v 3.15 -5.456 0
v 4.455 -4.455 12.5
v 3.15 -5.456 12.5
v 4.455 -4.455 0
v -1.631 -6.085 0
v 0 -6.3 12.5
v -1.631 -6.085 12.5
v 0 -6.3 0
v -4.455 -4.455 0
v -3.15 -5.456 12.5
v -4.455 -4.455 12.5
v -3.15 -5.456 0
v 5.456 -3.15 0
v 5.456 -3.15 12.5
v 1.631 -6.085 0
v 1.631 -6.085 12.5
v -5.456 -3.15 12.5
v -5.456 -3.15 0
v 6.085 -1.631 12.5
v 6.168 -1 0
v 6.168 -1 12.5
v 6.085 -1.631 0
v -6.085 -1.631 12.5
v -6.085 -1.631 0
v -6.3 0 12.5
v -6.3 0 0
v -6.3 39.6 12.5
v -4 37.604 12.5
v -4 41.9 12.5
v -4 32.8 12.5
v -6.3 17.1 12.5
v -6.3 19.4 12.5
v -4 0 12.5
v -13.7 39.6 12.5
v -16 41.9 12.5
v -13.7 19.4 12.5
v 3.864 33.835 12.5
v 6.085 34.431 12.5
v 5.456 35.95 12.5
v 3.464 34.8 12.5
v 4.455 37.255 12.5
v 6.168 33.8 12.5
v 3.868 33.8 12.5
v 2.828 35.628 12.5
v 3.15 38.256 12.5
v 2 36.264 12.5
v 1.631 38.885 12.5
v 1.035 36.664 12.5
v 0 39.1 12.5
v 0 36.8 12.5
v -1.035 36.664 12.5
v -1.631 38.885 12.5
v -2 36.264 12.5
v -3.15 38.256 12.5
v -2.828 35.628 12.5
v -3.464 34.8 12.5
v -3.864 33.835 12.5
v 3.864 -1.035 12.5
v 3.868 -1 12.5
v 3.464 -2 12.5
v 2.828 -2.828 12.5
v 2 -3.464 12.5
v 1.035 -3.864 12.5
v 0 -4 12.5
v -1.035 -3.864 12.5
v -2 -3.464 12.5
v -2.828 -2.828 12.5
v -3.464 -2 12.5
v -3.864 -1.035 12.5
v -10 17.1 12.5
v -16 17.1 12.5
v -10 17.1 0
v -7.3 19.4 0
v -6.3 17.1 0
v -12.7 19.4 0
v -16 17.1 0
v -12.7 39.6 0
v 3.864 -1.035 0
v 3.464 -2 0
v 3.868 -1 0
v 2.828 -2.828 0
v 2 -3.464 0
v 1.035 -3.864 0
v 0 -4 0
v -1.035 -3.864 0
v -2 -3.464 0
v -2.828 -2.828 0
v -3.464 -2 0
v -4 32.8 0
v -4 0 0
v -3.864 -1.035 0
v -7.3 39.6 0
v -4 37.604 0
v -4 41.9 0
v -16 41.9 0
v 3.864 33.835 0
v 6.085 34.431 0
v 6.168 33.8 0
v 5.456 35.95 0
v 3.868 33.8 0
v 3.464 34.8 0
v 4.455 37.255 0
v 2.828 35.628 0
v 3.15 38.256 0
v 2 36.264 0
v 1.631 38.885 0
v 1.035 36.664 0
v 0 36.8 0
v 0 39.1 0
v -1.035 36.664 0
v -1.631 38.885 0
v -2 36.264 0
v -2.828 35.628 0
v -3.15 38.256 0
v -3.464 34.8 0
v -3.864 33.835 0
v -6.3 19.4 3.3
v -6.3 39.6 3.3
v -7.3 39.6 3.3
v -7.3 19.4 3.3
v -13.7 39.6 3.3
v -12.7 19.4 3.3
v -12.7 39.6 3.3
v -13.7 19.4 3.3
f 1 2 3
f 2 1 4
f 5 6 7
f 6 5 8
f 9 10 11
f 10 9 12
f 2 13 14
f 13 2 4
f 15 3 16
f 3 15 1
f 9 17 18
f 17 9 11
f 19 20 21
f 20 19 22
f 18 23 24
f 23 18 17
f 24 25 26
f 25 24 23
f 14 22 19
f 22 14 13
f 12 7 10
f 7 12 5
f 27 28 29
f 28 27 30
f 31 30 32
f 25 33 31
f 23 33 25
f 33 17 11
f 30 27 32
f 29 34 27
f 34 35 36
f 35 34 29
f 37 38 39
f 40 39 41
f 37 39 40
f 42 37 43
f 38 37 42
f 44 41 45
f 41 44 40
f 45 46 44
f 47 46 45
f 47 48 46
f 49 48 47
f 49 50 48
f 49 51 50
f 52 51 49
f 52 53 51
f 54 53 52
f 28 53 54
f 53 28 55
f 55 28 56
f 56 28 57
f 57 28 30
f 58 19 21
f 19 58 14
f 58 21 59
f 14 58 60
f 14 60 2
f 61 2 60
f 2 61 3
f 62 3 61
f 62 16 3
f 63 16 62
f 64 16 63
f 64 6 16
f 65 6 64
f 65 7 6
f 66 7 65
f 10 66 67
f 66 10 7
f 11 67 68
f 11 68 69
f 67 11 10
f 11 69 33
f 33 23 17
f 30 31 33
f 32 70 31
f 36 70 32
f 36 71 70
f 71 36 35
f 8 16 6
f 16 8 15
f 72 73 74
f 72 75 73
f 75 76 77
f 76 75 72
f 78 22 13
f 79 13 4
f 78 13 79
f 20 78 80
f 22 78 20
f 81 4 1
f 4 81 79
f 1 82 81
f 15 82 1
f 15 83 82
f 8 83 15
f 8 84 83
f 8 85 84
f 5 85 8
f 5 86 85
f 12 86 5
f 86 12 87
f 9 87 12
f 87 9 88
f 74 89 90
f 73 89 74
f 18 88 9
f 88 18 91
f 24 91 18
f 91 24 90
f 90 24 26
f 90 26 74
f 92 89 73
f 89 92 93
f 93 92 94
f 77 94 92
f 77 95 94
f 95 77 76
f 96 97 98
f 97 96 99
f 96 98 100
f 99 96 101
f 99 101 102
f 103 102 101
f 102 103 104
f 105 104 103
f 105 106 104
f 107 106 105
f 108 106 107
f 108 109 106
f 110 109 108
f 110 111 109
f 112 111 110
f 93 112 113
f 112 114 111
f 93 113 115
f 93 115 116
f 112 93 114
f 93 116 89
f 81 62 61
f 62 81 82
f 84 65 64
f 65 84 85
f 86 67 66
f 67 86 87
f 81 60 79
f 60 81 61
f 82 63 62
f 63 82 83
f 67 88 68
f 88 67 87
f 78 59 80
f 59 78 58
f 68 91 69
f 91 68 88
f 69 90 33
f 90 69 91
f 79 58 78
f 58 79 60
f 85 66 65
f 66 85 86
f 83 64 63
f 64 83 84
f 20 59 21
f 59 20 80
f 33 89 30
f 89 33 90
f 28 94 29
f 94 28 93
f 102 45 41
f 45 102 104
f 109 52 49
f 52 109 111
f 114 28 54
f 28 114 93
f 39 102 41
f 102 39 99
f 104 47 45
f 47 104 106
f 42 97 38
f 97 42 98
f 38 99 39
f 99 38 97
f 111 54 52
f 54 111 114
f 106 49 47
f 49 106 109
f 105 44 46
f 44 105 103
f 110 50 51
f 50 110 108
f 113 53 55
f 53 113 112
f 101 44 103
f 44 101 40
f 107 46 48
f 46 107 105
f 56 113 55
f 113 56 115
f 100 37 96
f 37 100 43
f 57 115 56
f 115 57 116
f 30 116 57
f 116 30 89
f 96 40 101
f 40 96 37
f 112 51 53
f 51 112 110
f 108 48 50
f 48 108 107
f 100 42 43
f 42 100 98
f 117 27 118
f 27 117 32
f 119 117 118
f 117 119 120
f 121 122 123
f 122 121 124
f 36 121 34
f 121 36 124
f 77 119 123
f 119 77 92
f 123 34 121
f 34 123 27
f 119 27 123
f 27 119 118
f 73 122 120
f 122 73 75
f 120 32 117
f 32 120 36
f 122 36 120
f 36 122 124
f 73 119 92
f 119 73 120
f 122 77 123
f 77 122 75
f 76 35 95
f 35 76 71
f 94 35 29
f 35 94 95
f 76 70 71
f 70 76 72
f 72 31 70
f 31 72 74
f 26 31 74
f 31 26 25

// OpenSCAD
// This par is for parameters
//Parametric input values

 // Part tickness
part_thickness = 2.3;  // [2.0:5.0]

// Distance in between lower and upper Y bars ?
y_bars_gap =24.8;   //[15.0:30.0]

//Size of sliding rods 8, 10 , 12mm?
diam_8mm = 8; // [8,10,12]

// size of the endstop sensor ?
endstop_wt = 20; // [15:25]
endstop_ht = 10;  // [10:25]
endstop_dt =  7; // [5:10]

//-- End tunables--------------------------------------------------------------------------------------------------------------------------------------------
/* [Hidden] */
//Resolution
$fn = 24;

radius_3mm = 1.7;
radius_4mm = 2.2;
radius_8mm = diam_8mm / 2;

// stats about your i3
rod_frame_gap = 25;
frame_thickness = 6.8;

// size of the endstop
endstop_w = endstop_wt + 0.2;
endstop_h = endstop_ht + 0.2;
endstop_d = endstop_dt + 0.2 + 0.2;
// useful shorthand
pt2 = part_thickness / 2;

//End of parameters

//Commons

clip_h = endstop_h + part_thickness;
holder_d = endstop_d + part_thickness * 2;
holder_w = endstop_w + part_thickness * 2;

module endstop_holder() {
	difference() {
		translate([-holder_d / 2, radius_8mm, 0])
			cube([holder_d, holder_w, clip_h]);

		translate([-holder_d / 2, radius_8mm, 0]) {
			// cutout endstop hole
			translate([part_thickness, part_thickness, part_thickness + 1]) cube([endstop_d, endstop_w, endstop_h + 2]);

			// cutout endstop wire hole
			translate([part_thickness + 1, part_thickness, -0.5]) cube([endstop_d - 2, endstop_w, part_thickness + 2]);
		}
		// cutout the rod
		cylinder(r=radius_8mm, h=clip_h + 1);
	}
}

module screw(r=radius_3mm, length=10, cap=2, hex=false) {
	cylinder(r=r, h=length);
	translate([0, 0, length])
		difference() {
			cylinder(r1=r+1, r2=r + 0.8, h=cap);
			translate([0, 0, cap]) {
				if (hex) {
					cylinder(r=r, h=2, $fn=6, center=true);
				}
				else {
					rotate([0, 0, 45])
						cube([r * 2, r / 4, 2], center=true);
					rotate([0, 0, 135])
						cube([r * 2, r / 4, 2], center=true);
				}
			}
		}
}

// End of commons ----------------------------------------------------------------

// The piece itself Y-End-stop-clip_h


y_bar_dist = y_bars_gap + radius_8mm * 2;

module y_carriage_rods() {
	color([0.9,0.9,0.9])
		rotate([0,0,0]) {
			#cylinder(r=radius_8mm, h=100, center=true);
			#translate([0,y_bar_dist,0]) cylinder(r=radius_8mm, h=100, center=true);
		}
}

module rod_clip() {
	clip_r = radius_8mm + part_thickness;
	clip_h = endstop_h + part_thickness;
	difference() {
		cylinder(r=clip_r, h=clip_h);
		translate([0,0,clip_h/2]) cylinder(r=radius_8mm, h=clip_h + 1, center=true);
		translate([radius_8mm + 1, 3, clip_h / 2]) cube([4, 8, clip_h+1], center=true);
		translate([0,radius_8mm,clip_h / 2]) cube([diam_8mm,diam_8mm,clip_h+1], center=true);
	}
}

module i3_y_endstop() {
	union() {

		rod_clip();
		translate([0,y_bar_dist,clip_h])
			rotate([180,0,0])
				rod_clip();

		translate([-radius_8mm - pt2, y_bar_dist / 2, clip_h / 2])
			cube([part_thickness, y_bar_dist, clip_h], center=true);

		translate([-holder_d / 2 - radius_8mm,part_thickness+y_bars_gap-14,0])
			endstop_holder();

	} // union
}

//y_carriage_rods();

i3_y_endstop();
